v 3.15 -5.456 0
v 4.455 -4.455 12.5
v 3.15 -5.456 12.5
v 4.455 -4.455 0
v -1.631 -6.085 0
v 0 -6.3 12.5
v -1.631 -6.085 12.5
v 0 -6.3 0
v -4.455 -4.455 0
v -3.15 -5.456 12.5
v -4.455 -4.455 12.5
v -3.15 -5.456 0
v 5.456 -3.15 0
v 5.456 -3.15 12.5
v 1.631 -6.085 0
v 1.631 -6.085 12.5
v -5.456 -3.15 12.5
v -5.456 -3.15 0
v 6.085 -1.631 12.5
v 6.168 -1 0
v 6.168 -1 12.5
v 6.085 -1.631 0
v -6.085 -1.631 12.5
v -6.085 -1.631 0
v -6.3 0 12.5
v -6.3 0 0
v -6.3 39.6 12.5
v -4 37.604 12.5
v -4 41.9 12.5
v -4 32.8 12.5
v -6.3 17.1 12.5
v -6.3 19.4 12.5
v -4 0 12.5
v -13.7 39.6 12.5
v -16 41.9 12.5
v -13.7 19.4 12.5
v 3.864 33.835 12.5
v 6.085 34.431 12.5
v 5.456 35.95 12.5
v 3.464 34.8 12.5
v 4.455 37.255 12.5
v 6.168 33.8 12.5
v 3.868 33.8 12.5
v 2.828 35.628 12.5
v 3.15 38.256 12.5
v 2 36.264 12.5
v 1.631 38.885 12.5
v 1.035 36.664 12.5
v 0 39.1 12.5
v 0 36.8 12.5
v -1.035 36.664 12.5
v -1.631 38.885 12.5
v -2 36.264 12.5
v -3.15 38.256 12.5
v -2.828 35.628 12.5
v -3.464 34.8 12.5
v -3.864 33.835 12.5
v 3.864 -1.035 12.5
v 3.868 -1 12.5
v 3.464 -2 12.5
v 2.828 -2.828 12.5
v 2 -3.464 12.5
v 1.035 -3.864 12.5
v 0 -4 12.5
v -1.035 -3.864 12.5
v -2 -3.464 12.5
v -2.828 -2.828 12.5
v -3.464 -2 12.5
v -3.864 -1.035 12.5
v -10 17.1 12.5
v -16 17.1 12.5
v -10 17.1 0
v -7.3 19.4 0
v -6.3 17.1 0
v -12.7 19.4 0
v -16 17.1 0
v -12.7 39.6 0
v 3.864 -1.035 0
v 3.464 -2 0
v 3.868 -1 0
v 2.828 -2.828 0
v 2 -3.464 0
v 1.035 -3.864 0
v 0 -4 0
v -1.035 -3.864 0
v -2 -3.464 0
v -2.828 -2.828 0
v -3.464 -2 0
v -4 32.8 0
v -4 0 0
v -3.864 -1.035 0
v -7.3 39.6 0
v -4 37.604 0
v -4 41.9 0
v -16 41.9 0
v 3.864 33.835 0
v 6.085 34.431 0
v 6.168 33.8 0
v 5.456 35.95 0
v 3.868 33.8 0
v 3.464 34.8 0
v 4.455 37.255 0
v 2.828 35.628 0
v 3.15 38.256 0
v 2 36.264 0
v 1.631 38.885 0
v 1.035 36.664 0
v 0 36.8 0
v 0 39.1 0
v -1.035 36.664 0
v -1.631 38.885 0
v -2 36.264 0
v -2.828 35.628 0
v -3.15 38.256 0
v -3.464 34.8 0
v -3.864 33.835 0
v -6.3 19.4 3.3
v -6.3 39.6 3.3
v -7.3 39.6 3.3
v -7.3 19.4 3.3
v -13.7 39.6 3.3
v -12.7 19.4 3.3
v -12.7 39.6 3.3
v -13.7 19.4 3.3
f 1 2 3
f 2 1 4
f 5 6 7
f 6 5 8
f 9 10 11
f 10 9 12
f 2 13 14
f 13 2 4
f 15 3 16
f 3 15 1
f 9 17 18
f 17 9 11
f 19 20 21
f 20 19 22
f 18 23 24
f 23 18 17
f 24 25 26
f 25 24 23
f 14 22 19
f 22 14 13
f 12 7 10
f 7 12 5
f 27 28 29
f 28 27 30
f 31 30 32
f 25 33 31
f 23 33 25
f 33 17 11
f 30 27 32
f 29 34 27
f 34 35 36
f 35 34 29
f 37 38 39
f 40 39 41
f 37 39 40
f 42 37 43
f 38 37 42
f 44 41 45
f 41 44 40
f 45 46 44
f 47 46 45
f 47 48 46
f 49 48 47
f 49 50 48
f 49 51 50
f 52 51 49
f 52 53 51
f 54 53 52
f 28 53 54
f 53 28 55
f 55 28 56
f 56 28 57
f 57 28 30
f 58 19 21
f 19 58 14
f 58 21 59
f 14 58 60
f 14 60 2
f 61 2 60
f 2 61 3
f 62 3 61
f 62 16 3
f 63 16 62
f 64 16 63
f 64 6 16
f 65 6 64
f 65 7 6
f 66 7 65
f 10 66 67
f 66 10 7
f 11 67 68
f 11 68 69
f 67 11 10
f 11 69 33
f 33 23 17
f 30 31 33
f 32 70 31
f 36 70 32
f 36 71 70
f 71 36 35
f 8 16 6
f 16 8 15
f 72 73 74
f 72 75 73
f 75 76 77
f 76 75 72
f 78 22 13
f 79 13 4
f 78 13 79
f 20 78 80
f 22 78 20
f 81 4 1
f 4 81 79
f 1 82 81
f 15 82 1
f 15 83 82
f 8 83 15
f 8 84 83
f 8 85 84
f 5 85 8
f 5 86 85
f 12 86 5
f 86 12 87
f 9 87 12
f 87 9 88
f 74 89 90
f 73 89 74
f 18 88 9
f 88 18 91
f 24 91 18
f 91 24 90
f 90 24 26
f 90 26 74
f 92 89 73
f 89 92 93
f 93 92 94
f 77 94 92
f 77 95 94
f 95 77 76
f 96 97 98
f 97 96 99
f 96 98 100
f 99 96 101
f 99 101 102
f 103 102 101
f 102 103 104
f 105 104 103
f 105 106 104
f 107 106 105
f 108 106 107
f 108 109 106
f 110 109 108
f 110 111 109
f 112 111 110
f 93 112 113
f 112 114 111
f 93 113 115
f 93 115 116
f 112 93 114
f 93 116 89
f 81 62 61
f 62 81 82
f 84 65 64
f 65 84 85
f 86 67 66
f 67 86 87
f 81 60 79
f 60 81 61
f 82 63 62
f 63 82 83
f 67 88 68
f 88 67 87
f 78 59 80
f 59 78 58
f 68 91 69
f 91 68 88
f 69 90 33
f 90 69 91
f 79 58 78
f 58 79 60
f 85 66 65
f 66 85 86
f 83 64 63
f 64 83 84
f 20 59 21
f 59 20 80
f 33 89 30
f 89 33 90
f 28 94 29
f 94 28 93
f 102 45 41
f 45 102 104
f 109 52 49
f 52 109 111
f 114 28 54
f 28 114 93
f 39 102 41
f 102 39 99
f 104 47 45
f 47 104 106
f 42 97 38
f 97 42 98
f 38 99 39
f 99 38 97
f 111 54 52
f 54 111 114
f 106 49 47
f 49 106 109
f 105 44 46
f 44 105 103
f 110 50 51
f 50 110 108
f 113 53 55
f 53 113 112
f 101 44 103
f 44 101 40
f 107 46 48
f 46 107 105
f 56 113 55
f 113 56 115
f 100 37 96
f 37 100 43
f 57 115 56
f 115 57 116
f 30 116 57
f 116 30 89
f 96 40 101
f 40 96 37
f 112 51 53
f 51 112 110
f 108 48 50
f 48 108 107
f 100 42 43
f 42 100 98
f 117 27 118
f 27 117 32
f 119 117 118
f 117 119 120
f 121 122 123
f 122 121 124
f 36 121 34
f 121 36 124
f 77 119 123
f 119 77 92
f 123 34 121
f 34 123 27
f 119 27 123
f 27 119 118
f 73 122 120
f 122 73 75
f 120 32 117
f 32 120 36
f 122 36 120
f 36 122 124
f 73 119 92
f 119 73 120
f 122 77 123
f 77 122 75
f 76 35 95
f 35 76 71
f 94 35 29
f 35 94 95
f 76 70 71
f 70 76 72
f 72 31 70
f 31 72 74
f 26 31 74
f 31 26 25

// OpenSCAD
// This par is for parameters
//Parametric input values

 // Part tickness
part_thickness = 2.3;  // [2.0:5.0]

// Distance in between lower and upper Y bars ?
y_bars_gap =24.8;   //[15.0:30.0]

//Size of sliding rods 8, 10 , 12mm?
diam_8mm = 8; // [8,10,12]

// size of the endstop sensor ?
endstop_wt = 20; // [15:25]
endstop_ht = 10;  // [10:25]
endstop_dt =  7; // [5:10]

//-- End tunables--------------------------------------------------------------------------------------------------------------------------------------------
/* [Hidden] */
//Resolution
$fn = 24;

radius_3mm = 1.7;
radius_4mm = 2.2;
radius_8mm = diam_8mm / 2;

// stats about your i3
rod_frame_gap = 25;
frame_thickness = 6.8;

// size of the endstop
endstop_w = endstop_wt + 0.2;
endstop_h = endstop_ht + 0.2;
endstop_d = endstop_dt + 0.2 + 0.2;
// useful shorthand
pt2 = part_thickness / 2;

//End of parameters

//Commons

clip_h = endstop_h + part_thickness;
holder_d = endstop_d + part_thickness * 2;
holder_w = endstop_w + part_thickness * 2;

module endstop_holder() {
	difference() {
		translate([-holder_d / 2, radius_8mm, 0])
			cube([holder_d, holder_w, clip_h]);

		translate([-holder_d / 2, radius_8mm, 0]) {
			// cutout endstop hole
			translate([part_thickness, part_thickness, part_thickness + 1]) cube([endstop_d, endstop_w, endstop_h + 2]);

			// cutout endstop wire hole
			translate([part_thickness + 1, part_thickness, -0.5]) cube([endstop_d - 2, endstop_w, part_thickness + 2]);
		}
		// cutout the rod
		cylinder(r=radius_8mm, h=clip_h + 1);
	}
}

module screw(r=radius_3mm, length=10, cap=2, hex=false) {
	cylinder(r=r, h=length);
	translate([0, 0, length])
		difference() {
			cylinder(r1=r+1, r2=r + 0.8, h=cap);
			translate([0, 0, cap]) {
				if (hex) {
					cylinder(r=r, h=2, $fn=6, center=true);
				}
				else {
					rotate([0, 0, 45])
						cube([r * 2, r / 4, 2], center=true);
					rotate([0, 0, 135])
						cube([r * 2, r / 4, 2], center=true);
				}
			}
		}
}

// End of commons ----------------------------------------------------------------

// The piece itself Y-End-stop-clip_h


y_bar_dist = y_bars_gap + radius_8mm * 2;

module y_carriage_rods() {
	color([0.9,0.9,0.9])
		rotate([0,0,0]) {
			#cylinder(r=radius_8mm, h=100, center=true);
			#translate([0,y_bar_dist,0]) cylinder(r=radius_8mm, h=100, center=true);
		}
}

module rod_clip() {
	clip_r = radius_8mm + part_thickness;
	clip_h = endstop_h + part_thickness;
	difference() {
		cylinder(r=clip_r, h=clip_h);
		translate([0,0,clip_h/2]) cylinder(r=radius_8mm, h=clip_h + 1, center=true);
		translate([radius_8mm + 1, 3, clip_h / 2]) cube([4, 8, clip_h+1], center=true);
		translate([0,radius_8mm,clip_h / 2]) cube([diam_8mm,diam_8mm,clip_h+1], center=true);
	}
}

module i3_y_endstop() {
	union() {

		rod_clip();
		translate([0,y_bar_dist,clip_h])
			rotate([180,0,0])
				rod_clip();

		translate([-radius_8mm - pt2, y_bar_dist / 2, clip_h / 2])
			cube([part_thickness, y_bar_dist, clip_h], center=true);

		translate([-holder_d / 2 - radius_8mm,part_thickness+y_bars_gap-14,0])
			endstop_holder();

	} // union
}

//y_carriage_rods();

i3_y_endstop();
